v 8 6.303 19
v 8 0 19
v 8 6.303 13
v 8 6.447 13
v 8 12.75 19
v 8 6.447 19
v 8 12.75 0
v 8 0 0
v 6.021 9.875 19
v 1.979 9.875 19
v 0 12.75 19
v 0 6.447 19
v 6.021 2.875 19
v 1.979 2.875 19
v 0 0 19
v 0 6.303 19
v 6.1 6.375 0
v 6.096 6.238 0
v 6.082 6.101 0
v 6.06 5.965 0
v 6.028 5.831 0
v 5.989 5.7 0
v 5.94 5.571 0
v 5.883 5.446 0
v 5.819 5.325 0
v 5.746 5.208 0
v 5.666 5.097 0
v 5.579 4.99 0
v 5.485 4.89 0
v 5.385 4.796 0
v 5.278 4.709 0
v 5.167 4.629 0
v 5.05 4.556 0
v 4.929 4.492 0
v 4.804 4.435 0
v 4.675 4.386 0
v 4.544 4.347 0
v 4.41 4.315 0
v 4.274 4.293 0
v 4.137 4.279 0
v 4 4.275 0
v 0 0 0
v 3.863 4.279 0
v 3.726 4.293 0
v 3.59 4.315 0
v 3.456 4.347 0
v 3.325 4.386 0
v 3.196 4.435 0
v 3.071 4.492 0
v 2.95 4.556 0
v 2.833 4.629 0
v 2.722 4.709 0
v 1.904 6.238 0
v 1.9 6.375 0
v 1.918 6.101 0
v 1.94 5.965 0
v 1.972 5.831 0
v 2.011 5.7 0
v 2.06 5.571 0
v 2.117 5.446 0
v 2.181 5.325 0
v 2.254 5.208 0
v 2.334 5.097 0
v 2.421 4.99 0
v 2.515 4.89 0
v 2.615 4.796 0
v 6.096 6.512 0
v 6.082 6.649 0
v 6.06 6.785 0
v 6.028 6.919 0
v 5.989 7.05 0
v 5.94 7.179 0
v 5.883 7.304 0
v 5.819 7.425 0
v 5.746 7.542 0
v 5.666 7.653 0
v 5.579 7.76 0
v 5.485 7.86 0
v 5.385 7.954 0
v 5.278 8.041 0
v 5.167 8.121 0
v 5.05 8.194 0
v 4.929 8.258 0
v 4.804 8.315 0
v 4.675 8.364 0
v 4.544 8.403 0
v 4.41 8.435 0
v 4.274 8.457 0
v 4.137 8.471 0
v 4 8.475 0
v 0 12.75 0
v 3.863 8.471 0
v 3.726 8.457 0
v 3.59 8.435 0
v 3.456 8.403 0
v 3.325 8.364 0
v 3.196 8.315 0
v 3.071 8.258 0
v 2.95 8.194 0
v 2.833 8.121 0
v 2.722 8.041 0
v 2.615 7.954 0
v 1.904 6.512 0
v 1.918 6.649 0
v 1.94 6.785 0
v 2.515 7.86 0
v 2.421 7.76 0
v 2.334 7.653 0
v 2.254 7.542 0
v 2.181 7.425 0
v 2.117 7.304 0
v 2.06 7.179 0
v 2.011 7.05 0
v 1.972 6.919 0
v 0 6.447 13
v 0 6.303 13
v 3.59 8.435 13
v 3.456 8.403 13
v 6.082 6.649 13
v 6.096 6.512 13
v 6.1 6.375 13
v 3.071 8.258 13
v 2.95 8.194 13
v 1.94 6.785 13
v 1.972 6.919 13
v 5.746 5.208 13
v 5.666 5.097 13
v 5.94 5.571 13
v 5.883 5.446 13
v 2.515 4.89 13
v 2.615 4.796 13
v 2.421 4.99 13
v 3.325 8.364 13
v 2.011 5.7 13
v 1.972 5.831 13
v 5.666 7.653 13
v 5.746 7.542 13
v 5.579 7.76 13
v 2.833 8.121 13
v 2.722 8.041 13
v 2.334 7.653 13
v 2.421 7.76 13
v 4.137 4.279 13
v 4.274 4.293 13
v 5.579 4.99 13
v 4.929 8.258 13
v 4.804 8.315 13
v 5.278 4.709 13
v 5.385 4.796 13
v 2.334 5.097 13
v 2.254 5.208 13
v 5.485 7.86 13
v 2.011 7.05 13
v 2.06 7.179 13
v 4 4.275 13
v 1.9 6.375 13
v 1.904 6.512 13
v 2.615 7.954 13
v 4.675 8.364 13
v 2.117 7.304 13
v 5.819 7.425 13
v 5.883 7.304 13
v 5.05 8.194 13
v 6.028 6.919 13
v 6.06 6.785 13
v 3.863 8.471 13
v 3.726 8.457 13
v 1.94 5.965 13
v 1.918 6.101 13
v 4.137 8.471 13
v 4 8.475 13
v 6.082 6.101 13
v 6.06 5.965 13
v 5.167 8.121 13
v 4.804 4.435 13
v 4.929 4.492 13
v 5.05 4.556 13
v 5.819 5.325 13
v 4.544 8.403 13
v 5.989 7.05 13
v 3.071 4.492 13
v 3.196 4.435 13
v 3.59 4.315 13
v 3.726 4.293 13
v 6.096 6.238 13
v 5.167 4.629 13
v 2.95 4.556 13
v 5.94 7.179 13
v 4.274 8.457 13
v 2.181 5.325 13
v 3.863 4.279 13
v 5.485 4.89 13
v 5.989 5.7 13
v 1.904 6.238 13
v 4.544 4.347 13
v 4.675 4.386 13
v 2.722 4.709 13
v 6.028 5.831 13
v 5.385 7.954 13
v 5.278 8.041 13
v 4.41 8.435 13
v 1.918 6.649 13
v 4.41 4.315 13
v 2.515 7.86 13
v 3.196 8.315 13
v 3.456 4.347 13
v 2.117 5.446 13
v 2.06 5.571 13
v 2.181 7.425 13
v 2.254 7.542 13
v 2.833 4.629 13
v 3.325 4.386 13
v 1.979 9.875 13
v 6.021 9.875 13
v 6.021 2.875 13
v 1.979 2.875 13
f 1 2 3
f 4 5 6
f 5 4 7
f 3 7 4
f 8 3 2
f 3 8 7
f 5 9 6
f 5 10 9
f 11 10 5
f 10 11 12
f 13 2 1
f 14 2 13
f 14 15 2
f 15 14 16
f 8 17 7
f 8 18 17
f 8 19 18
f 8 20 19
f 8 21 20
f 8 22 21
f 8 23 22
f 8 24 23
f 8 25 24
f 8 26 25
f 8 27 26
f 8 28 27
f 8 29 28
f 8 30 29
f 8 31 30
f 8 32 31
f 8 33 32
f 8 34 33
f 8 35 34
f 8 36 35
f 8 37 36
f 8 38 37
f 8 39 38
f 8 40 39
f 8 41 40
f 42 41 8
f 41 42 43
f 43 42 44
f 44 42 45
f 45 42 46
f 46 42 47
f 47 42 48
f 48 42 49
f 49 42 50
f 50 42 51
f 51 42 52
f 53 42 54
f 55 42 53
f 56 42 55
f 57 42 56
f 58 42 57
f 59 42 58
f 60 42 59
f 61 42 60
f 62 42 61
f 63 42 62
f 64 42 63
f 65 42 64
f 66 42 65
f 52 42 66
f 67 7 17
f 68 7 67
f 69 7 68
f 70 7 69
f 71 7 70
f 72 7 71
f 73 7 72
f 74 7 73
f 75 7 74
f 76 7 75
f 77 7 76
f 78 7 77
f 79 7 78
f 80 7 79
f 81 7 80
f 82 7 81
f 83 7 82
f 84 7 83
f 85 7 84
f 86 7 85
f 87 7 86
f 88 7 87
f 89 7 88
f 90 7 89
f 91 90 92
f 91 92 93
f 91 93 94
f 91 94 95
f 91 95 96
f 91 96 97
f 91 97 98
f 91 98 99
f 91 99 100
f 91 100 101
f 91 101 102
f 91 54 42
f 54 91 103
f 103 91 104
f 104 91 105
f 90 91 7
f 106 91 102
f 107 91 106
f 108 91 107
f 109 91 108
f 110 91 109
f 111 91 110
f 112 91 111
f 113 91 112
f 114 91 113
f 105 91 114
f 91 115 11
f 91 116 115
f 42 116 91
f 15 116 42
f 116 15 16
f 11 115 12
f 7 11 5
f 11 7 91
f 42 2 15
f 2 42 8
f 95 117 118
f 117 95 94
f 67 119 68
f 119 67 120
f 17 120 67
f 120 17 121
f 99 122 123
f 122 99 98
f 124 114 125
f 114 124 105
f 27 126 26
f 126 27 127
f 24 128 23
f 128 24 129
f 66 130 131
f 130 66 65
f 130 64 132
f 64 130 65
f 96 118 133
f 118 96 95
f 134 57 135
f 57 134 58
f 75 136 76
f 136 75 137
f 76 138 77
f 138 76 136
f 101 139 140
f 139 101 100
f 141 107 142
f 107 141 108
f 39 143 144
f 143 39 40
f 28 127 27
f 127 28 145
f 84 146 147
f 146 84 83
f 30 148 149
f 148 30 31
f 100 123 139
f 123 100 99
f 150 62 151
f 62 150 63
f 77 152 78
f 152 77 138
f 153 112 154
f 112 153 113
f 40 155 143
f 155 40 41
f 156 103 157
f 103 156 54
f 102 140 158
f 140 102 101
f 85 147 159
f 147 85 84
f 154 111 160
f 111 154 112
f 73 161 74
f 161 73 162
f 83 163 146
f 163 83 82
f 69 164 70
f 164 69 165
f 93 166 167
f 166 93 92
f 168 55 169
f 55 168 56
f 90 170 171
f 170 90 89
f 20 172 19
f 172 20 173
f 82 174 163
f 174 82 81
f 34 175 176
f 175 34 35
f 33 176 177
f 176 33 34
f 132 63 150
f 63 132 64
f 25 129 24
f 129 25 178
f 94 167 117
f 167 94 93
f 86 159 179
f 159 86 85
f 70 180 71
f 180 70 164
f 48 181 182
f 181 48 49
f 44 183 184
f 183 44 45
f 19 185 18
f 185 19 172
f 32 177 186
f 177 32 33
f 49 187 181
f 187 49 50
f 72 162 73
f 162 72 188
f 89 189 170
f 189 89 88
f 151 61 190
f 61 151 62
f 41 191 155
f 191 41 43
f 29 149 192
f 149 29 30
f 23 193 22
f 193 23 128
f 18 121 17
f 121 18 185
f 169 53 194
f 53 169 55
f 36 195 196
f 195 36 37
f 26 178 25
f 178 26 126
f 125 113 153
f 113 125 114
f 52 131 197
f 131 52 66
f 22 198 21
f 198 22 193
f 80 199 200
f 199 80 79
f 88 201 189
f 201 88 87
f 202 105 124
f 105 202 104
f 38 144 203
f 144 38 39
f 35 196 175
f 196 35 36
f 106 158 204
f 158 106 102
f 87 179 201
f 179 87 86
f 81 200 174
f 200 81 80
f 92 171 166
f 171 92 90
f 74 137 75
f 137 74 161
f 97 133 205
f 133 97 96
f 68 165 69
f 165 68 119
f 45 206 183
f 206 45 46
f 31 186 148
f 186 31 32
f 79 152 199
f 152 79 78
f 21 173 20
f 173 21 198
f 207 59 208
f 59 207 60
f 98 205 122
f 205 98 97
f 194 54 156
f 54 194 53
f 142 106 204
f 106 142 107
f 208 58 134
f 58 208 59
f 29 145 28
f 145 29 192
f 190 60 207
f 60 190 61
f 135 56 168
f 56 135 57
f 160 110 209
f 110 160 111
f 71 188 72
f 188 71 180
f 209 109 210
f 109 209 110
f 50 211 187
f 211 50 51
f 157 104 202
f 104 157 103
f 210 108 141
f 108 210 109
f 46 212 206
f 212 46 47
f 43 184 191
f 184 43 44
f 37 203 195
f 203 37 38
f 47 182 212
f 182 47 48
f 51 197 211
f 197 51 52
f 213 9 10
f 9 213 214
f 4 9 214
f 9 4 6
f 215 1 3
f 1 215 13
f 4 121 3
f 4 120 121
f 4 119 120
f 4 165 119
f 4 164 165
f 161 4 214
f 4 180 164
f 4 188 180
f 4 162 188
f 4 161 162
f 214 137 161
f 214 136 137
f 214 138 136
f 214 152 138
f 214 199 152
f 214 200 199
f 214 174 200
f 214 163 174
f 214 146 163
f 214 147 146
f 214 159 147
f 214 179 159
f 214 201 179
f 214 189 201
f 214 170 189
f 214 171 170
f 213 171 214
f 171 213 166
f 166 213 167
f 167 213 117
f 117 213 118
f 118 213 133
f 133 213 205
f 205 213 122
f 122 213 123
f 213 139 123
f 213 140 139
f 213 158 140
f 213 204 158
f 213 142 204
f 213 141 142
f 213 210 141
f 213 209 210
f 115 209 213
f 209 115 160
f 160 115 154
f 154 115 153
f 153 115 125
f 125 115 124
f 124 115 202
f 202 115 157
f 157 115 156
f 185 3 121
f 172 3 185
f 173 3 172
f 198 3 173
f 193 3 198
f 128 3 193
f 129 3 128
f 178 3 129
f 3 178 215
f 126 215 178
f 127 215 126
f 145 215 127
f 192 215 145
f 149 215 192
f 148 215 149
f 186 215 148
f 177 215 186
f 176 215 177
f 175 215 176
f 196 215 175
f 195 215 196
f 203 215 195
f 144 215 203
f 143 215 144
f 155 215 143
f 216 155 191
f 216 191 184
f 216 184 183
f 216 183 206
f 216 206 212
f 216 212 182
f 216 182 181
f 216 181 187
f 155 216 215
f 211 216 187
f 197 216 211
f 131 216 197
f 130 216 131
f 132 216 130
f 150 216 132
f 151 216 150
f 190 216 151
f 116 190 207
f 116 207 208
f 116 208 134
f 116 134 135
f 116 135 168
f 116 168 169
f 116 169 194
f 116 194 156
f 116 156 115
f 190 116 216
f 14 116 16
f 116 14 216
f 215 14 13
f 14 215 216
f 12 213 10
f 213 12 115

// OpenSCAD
$fn = 96;

// Overall block size (must match request)
block_x = 8.0;
block_y = 12.75;
block_z = 19.0;

// Feature parameters (typical small leadscrew nut housing)
bore_d      = 4.2;   // through-hole for leadscrew (along Z)
nut_flat    = 7.0;   // hex pocket across flats
nut_depth   = 6.0;   // depth of hex pocket from top face
mount_d     = 2.2;   // mounting through-holes (along Y)
mount_edge  = 2.0;   // distance from side faces to hole centers
mount_z_off = 4.0;   // distance from top/bottom faces to hole centers

eps = 0.02;

module hex_prism(af, h) {
    // Regular hex with across-flats = af
    r = af / sqrt(3); // circumradius
    cylinder(h=h, r=r, $fn=6, center=false);
}

difference() {
    // Main body: rectangular leadscrew nut housing block
    cube([block_x, block_y, block_z], center=false);

    // Leadscrew through-bore (along Z, centered in X/Y)
    translate([block_x/2, block_y/2, -eps])
        cylinder(h=block_z + 2*eps, d=bore_d, center=false);

    // Hex nut pocket from top face (coaxial with bore)
    translate([block_x/2, block_y/2, block_z - nut_depth])
        hex_prism(nut_flat, nut_depth + eps);

    // Two mounting through-holes (along Y), symmetric in X and Z
    // (2 holes total: left/right in X, centered in Z)
    for (sx = [-1, 1]) {
        translate([
            block_x/2 + sx*(block_x/2 - mount_edge),
            -eps,
            block_z/2
        ])
            rotate([90, 0, 0])
                cylinder(h=block_y + 2*eps, d=mount_d, center=false);
    }
}
